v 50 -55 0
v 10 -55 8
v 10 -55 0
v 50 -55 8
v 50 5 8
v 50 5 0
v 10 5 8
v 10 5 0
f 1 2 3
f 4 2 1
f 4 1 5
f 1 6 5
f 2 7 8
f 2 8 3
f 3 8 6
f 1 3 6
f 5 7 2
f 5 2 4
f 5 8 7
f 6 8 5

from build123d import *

# Parameters (mm, degrees)
F0_W      = 100
F0_H      = 10
F1_DEPTH  = 8
F1_FACE_W = 100
F1_FACE_H = 8
F2_DEPTH  = 50
F2_FACE_W = 60
F2_FACE_H = 8
F3_DEPTH  = 60


with BuildPart() as f1:
    # F0 (on Top) → F1 (new body)
    with BuildSketch(Plane.XY):
        Rectangle(F0_W, F0_H)
    extrude(amount=F1_DEPTH)

    # F1_face (on face) → F2 (join)
    with BuildSketch(Plane(origin=(0, -5, 4), x_dir=(1, 0, 0), z_dir=(0, -1, 0))):
        Rectangle(F1_FACE_W, F1_FACE_H)
    extrude(amount=F2_DEPTH)

    # F2_face (on face) → F3 (cut)
    with BuildSketch(Plane(origin=(-50, -25, 4), x_dir=(0, -1, 0), z_dir=(-1, 0, 0))):
        Rectangle(F2_FACE_W, F2_FACE_H)
    extrude(amount=-F3_DEPTH, mode=Mode.SUBTRACT)


solid = f1.part
